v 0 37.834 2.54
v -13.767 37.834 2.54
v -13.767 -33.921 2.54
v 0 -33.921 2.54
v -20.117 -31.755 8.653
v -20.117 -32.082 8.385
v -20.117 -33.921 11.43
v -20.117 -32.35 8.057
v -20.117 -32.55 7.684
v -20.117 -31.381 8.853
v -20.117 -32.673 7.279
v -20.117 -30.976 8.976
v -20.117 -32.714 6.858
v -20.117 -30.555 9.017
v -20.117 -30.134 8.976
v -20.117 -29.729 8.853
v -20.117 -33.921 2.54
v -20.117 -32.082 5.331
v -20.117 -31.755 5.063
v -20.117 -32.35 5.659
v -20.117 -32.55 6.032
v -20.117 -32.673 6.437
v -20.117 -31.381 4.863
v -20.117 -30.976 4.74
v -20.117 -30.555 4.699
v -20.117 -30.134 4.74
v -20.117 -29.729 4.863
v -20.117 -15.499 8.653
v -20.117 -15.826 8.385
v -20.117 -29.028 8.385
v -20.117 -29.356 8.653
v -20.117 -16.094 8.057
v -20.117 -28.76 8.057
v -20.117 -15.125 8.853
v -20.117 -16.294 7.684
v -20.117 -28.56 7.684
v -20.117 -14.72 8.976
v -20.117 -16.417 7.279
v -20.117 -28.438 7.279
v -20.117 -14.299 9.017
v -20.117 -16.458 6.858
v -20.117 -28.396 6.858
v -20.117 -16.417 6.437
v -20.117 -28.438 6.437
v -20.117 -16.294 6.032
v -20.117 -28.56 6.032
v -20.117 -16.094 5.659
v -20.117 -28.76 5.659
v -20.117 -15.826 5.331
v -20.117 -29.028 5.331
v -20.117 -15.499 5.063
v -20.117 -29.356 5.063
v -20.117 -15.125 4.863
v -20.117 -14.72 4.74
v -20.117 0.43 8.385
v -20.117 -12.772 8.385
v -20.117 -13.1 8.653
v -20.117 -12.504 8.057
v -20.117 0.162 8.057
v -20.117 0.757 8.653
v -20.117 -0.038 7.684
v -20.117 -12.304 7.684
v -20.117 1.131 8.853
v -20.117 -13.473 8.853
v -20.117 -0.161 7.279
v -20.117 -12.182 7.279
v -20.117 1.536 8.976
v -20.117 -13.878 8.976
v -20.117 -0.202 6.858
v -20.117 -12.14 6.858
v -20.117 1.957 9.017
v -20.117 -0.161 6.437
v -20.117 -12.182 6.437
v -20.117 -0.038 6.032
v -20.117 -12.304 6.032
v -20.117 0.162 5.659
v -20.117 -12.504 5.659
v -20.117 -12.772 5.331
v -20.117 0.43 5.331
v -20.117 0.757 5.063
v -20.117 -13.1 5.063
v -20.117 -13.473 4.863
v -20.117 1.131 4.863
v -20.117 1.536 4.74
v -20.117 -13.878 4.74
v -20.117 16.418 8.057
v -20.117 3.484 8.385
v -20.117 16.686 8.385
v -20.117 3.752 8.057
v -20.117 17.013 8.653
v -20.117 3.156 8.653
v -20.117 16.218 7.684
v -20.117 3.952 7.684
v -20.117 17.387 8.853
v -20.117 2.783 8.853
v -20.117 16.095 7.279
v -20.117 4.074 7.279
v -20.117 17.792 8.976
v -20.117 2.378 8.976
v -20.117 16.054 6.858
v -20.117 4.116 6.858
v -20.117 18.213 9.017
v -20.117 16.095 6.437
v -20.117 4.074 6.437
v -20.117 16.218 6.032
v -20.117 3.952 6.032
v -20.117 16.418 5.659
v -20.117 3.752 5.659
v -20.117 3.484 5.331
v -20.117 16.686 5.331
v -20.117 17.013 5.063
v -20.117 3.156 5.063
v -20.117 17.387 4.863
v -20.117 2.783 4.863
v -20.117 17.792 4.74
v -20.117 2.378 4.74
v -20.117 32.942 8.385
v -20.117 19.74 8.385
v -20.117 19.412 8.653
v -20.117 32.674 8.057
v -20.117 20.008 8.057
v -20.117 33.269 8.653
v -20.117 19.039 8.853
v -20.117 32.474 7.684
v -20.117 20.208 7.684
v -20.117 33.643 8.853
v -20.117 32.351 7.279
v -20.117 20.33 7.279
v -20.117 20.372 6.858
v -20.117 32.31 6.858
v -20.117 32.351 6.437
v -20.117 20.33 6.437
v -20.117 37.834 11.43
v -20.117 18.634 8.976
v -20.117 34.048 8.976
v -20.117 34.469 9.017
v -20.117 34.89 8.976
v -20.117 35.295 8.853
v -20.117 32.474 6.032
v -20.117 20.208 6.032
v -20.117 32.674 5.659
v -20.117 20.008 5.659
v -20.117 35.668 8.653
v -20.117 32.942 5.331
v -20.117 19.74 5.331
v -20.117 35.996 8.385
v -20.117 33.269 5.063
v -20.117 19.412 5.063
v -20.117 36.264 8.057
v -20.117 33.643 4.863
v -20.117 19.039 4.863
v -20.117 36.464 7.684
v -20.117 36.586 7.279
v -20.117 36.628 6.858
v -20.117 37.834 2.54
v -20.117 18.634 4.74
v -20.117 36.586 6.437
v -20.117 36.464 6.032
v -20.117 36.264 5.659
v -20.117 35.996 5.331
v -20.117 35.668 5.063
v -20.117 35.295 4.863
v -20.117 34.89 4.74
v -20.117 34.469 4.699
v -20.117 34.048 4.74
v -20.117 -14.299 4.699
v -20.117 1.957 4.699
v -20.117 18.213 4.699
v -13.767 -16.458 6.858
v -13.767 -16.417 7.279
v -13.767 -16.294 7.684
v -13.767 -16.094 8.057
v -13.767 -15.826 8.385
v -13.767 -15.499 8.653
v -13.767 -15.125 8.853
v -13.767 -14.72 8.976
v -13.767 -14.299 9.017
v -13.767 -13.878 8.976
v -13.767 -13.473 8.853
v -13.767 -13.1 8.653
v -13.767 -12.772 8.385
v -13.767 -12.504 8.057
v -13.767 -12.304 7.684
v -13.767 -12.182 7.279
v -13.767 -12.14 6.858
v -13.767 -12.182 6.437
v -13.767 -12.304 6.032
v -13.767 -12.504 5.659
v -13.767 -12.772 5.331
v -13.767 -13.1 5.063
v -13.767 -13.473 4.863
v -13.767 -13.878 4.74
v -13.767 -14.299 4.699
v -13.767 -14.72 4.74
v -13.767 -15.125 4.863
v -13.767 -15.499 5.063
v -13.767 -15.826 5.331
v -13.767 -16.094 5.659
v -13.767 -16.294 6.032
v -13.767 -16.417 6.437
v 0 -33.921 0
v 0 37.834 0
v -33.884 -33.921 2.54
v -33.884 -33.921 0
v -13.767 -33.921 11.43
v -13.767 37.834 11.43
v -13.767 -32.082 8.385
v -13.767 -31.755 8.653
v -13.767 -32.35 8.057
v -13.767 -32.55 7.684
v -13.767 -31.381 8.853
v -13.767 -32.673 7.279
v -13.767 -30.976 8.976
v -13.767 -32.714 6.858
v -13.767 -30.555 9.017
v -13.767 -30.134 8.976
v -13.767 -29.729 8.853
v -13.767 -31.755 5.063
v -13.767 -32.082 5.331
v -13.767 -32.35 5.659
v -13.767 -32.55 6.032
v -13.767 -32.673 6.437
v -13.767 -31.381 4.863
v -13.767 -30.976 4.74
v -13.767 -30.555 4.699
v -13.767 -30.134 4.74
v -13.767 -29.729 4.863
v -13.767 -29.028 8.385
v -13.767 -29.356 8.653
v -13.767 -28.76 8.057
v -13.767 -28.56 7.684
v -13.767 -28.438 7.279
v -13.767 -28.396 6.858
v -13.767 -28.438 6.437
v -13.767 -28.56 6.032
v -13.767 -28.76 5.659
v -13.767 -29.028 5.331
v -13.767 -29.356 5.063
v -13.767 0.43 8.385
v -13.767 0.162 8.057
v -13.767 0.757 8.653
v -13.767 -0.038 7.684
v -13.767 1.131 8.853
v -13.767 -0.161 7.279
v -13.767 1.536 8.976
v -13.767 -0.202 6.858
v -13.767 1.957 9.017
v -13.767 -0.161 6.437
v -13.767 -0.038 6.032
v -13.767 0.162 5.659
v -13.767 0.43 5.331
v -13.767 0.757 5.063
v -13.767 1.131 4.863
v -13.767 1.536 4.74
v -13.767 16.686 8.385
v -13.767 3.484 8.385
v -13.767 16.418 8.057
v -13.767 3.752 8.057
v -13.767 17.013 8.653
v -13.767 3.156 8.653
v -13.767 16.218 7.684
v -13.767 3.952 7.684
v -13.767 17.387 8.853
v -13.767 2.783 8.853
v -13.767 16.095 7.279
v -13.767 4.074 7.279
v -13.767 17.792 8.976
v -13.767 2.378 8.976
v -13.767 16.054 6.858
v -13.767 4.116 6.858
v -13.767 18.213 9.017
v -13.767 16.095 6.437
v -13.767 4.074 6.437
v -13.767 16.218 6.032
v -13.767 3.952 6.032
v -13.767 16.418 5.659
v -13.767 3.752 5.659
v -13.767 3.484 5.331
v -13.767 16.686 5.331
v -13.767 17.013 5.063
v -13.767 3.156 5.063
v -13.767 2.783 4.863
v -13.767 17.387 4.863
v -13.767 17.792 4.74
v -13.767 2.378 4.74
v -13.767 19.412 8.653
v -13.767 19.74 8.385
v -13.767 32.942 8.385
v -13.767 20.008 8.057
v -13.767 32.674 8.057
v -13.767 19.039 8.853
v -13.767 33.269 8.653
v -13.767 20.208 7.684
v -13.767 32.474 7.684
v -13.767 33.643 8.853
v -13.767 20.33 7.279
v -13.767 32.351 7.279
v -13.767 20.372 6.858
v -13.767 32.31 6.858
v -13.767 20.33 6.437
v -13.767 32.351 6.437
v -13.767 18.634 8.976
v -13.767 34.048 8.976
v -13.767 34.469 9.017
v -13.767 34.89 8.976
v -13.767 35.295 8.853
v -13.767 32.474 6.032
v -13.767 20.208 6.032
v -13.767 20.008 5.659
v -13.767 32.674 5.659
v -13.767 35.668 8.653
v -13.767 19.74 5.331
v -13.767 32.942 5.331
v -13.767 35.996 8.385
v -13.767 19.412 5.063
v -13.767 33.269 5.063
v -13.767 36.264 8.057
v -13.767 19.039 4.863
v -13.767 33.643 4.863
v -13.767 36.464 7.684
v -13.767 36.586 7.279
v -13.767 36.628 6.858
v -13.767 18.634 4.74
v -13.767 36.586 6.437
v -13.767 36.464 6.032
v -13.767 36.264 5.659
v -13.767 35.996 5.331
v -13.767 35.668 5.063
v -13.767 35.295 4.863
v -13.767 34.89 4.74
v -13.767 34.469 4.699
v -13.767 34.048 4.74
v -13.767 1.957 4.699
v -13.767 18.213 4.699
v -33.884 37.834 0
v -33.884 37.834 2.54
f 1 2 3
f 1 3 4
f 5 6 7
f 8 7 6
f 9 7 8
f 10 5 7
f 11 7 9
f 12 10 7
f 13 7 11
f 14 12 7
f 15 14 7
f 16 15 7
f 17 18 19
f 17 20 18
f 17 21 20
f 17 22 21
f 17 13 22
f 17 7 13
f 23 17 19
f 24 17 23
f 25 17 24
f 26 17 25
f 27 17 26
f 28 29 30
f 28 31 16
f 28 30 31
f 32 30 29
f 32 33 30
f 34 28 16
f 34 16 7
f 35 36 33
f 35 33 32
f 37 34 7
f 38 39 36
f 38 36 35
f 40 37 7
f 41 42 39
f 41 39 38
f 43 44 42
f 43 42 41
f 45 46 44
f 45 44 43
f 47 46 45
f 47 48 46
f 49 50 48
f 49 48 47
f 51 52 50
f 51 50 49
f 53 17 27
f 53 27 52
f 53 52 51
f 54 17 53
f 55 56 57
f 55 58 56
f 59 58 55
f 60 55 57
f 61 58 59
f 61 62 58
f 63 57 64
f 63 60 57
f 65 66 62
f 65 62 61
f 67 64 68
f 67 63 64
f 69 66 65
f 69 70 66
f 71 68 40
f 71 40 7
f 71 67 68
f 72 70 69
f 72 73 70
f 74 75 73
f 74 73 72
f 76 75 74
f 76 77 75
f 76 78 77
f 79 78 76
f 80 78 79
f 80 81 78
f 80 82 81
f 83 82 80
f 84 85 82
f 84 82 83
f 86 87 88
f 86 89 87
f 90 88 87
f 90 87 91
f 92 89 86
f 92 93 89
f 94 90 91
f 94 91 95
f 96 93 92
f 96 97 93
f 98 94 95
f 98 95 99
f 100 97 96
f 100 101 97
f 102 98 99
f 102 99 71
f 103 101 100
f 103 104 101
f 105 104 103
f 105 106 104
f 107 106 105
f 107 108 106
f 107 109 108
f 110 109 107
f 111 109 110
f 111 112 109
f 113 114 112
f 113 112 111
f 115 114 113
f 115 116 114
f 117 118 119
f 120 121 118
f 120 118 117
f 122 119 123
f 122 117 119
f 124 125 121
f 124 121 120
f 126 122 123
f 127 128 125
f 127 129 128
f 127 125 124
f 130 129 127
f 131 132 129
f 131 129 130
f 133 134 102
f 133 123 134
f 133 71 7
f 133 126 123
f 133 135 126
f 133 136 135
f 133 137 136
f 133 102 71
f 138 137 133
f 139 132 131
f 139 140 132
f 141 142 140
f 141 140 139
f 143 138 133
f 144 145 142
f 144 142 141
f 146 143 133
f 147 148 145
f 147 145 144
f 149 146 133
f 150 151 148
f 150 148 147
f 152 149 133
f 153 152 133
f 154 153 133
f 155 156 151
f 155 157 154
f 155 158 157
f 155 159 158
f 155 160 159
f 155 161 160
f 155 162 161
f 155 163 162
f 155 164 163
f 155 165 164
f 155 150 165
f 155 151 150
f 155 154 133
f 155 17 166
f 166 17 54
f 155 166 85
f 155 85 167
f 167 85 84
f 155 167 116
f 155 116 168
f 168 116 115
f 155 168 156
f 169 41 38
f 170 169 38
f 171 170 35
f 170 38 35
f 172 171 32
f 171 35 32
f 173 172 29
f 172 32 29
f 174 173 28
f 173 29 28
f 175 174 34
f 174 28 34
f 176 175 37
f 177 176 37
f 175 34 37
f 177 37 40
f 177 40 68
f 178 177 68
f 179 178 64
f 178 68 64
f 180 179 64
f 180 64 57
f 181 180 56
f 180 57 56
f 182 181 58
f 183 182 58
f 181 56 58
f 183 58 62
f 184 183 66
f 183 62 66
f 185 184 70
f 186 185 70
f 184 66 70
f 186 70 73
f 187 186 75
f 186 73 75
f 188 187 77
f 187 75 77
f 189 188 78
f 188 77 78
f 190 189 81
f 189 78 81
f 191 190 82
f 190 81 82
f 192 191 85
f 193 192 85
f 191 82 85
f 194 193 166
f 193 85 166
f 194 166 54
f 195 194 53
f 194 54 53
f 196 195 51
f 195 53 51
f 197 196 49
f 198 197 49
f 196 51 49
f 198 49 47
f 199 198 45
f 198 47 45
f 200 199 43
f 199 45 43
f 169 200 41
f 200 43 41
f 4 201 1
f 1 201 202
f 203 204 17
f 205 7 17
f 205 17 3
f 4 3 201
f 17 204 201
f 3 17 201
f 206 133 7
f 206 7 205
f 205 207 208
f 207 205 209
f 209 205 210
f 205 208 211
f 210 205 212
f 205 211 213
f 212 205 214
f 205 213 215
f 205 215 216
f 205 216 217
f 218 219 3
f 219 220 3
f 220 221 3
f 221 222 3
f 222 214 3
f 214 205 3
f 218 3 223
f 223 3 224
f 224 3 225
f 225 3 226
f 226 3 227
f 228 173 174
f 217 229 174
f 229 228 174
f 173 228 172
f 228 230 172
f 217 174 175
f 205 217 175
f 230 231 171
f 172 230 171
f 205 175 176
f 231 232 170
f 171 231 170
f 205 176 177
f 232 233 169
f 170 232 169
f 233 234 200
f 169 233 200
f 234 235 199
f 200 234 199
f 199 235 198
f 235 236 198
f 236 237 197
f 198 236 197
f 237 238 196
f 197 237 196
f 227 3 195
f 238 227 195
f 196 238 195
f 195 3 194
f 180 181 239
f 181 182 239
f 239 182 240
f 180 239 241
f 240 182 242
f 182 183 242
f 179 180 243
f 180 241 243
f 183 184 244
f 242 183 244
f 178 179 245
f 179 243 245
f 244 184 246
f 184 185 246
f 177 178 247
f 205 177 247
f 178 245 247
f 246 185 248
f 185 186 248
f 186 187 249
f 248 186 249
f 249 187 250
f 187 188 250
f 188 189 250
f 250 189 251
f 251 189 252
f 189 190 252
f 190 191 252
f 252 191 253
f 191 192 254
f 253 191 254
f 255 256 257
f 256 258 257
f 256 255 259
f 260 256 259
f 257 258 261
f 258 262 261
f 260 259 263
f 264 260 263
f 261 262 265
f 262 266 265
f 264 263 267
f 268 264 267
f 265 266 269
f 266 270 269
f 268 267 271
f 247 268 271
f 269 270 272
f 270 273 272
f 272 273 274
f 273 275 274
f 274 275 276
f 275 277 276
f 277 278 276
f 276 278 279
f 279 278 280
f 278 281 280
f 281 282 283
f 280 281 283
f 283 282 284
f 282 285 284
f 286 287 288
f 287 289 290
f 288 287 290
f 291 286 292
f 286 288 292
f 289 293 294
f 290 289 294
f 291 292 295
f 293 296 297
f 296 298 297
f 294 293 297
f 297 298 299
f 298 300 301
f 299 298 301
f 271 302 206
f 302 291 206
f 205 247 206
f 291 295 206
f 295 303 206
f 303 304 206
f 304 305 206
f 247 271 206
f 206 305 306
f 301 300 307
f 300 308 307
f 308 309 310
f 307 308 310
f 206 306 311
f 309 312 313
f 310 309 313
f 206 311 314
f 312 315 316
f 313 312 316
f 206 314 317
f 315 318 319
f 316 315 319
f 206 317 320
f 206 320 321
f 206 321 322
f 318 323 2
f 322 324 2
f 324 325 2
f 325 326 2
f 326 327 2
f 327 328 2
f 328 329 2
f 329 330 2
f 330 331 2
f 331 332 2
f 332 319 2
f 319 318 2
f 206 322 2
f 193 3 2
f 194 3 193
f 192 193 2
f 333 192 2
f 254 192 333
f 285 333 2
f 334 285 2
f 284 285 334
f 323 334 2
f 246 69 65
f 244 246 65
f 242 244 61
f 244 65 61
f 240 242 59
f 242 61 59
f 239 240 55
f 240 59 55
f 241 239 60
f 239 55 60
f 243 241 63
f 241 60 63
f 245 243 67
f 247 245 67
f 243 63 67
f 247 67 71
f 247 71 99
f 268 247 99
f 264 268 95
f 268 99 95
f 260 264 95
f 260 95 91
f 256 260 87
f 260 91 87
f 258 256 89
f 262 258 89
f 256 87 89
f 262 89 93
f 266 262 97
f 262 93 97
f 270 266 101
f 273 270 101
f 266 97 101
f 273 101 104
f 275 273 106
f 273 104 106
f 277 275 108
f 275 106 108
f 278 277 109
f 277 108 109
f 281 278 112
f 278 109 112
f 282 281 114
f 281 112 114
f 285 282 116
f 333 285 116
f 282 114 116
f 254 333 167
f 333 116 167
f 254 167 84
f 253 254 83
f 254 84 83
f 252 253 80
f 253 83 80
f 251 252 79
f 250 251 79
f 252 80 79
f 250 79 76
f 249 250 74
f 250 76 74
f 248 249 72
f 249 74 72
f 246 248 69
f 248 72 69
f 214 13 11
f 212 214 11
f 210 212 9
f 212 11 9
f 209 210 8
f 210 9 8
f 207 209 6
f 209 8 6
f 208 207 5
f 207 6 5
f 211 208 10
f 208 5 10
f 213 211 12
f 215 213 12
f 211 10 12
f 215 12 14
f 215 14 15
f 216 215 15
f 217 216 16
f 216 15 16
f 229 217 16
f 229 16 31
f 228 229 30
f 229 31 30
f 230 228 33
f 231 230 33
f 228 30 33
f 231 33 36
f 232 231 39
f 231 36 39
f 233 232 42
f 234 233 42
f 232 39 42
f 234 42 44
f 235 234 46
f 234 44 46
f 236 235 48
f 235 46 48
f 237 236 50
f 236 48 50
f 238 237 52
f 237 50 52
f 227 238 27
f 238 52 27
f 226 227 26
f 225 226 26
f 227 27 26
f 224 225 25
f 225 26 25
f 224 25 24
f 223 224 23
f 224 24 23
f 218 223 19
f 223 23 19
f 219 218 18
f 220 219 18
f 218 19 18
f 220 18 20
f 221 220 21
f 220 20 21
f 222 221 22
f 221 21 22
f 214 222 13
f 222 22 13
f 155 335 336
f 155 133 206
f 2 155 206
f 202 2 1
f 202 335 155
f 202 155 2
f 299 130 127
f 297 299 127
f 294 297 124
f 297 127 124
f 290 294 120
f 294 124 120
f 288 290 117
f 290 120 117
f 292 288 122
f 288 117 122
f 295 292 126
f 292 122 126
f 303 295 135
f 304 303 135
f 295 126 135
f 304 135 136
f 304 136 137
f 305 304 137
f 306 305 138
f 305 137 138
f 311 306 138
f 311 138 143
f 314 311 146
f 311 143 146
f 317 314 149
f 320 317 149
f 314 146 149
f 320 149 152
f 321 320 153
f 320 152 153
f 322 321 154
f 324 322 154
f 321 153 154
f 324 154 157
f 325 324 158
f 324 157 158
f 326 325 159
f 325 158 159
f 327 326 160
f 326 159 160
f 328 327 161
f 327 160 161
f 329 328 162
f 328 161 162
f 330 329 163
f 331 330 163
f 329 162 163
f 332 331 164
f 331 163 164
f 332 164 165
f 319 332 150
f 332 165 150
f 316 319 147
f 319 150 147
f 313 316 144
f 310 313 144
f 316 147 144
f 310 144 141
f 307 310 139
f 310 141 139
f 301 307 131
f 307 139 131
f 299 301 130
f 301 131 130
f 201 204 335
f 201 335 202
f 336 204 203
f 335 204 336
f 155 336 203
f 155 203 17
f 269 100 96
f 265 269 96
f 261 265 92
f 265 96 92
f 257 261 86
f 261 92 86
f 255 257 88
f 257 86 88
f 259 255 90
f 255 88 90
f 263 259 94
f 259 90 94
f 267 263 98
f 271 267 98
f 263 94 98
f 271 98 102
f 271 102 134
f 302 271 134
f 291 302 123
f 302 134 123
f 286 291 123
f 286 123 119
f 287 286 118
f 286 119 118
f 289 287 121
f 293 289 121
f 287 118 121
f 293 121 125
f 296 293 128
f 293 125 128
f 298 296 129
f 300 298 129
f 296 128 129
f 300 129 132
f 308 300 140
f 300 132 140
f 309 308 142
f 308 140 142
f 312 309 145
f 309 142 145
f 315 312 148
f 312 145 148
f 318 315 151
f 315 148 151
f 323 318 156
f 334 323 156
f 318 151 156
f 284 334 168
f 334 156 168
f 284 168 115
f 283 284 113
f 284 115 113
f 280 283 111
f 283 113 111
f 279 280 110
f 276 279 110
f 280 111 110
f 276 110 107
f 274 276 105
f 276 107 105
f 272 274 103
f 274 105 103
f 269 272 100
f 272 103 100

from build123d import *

# Parameters (mm, degrees)
F0_W     = 33.8836
F0_H     = 71.755
F1_DEPTH = 2.54
F2_W     = 6.35
F2_H     = 71.755
F3_DEPTH = 8.89
F4_R     = 2.159
F5_DEPTH = 6.35


with BuildPart() as f1:
    # F0 (on Top) → F1 (new body)
    with BuildSketch(Plane.XY):
        with Locations((-16.9418, 1.956956)):
            Rectangle(F0_W, F0_H)
    extrude(amount=F1_DEPTH)

    # F2 (on face) → F3 (join)
    with BuildSketch(Plane.XY.offset(2.54)):
        with Locations((-16.9418, 1.956956)):
            Rectangle(F2_W, F2_H)
    extrude(amount=F3_DEPTH)

    # F4 (on face) → F5 (cut)
    with BuildSketch(Plane(origin=(-20.1168, 0, 0), x_dir=(0, -1, 0), z_dir=(-1, 0, 0))):
        with Locations((-18.212956, 6.858)):
            Circle(F4_R)
        with Locations((-34.468956, 6.858)):
            Circle(F4_R)
        with Locations((-1.956956, 6.858)):
            Circle(F4_R)
        with Locations((14.299044, 6.858)):
            Circle(F4_R)
        with Locations((30.555044, 6.858)):
            Circle(F4_R)
    extrude(amount=-F5_DEPTH, mode=Mode.SUBTRACT)


solid = f1.part
